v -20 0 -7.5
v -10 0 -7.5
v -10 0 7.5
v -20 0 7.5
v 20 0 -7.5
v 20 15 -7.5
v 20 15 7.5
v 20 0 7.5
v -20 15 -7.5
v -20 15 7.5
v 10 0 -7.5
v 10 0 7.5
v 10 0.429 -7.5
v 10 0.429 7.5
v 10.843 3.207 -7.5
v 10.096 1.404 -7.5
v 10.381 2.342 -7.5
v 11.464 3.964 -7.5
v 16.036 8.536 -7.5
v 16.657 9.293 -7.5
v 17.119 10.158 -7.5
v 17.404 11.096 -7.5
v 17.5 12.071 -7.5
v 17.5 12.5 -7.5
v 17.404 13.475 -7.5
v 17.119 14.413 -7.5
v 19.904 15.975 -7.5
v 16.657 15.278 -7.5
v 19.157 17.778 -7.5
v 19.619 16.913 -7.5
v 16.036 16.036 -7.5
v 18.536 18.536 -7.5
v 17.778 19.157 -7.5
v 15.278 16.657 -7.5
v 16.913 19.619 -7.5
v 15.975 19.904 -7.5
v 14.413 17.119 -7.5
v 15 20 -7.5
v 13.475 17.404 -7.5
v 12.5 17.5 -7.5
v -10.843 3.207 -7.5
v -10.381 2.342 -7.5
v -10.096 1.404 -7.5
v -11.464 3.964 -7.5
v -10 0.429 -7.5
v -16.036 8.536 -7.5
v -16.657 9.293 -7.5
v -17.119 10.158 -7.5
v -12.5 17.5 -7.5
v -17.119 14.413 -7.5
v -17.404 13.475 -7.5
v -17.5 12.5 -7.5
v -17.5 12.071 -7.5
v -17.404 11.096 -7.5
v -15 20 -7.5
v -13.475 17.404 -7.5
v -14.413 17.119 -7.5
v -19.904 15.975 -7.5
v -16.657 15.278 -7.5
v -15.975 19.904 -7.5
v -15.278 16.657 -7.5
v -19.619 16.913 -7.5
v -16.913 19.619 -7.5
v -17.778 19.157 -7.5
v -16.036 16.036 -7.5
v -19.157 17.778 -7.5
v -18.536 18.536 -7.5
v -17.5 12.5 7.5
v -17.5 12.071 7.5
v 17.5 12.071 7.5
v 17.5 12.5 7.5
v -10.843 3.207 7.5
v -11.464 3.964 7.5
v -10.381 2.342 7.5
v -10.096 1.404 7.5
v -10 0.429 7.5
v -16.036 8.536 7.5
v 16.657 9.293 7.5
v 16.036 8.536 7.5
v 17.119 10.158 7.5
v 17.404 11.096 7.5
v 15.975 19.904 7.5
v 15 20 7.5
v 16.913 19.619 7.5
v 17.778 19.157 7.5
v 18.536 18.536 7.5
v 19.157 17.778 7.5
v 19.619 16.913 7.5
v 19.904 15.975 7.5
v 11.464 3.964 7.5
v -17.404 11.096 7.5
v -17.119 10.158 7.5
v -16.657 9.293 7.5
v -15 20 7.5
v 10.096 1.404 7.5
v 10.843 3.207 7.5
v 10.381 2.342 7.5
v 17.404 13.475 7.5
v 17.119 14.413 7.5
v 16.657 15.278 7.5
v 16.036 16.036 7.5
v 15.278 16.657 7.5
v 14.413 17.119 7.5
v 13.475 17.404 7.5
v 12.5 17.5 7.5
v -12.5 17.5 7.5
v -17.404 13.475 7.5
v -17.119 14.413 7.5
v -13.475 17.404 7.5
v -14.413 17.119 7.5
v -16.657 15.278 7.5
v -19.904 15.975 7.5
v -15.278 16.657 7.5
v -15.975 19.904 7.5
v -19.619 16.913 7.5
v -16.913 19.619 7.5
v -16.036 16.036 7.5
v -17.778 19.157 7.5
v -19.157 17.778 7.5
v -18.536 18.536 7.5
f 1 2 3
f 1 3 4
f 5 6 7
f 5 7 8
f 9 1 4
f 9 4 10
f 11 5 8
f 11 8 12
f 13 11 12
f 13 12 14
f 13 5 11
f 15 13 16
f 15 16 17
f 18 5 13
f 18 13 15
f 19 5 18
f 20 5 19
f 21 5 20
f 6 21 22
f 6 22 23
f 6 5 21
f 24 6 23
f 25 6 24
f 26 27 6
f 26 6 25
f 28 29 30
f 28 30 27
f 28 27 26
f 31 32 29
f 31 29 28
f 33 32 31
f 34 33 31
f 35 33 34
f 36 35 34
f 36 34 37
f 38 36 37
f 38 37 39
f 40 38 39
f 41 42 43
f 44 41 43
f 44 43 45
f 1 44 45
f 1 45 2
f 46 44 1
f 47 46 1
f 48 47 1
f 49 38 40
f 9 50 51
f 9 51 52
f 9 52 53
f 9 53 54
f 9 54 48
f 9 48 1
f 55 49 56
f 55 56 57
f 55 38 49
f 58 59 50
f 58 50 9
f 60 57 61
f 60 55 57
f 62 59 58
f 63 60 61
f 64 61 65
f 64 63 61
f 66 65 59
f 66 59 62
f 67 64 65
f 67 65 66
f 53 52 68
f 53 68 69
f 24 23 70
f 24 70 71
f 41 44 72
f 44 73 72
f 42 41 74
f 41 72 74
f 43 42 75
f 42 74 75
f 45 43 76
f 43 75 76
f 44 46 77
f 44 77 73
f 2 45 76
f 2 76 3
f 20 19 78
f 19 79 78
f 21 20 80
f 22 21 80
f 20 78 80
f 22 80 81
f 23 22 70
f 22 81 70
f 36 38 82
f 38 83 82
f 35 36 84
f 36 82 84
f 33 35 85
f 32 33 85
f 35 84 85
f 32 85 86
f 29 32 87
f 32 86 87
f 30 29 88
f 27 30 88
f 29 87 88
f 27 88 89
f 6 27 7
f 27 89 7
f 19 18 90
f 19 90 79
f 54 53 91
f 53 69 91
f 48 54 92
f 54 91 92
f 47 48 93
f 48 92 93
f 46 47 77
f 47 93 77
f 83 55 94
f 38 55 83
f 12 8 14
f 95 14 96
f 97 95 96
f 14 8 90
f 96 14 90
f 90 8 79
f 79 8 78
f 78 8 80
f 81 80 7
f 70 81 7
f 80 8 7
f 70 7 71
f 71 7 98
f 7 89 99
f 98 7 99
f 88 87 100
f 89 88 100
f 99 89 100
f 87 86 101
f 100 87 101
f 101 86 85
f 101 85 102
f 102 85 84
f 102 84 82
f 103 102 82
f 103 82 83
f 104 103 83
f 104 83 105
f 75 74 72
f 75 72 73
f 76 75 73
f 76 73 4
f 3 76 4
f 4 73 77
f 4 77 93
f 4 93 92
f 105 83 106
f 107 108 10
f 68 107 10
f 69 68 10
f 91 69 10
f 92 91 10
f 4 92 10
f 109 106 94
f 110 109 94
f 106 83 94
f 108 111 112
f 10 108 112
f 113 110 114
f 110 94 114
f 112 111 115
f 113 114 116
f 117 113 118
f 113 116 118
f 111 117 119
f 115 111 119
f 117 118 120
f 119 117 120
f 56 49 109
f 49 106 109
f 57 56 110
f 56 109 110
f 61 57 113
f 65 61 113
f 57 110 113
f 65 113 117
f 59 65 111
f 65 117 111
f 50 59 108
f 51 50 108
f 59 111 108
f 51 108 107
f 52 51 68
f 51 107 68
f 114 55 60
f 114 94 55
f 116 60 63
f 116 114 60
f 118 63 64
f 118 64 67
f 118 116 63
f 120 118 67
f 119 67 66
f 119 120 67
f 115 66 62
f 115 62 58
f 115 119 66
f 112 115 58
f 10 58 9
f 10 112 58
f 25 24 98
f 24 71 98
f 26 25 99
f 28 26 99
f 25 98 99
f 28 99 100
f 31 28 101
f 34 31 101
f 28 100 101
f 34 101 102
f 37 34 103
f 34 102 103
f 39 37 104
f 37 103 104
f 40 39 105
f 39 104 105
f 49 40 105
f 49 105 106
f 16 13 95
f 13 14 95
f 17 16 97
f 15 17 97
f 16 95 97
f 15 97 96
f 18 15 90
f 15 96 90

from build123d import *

# Parameters (mm, degrees)
BOSS_EXTRUDE1_DEPTH      = 7.5
BOSS_EXTRUDE1_DEPTH_BACK = 7.5
FILLET1_R                = 5


with BuildPart() as part:
    # Sketch1 → Boss-Extrude1 (new, two sides: drawn at the far end of the back side and taken through both)
    with BuildSketch(Plane.XY.offset(-BOSS_EXTRUDE1_DEPTH_BACK)):
        Polygon((-20, 20), (20, 20), (20, 0), (10, 0), (10, 2.5), (17.5, 10), (17.5, 17.5), (-17.5, 17.5), (-17.5, 10), (-10, 2.5), (-10, 0), (-20, 0), align=None)
    extrude(amount=BOSS_EXTRUDE1_DEPTH + BOSS_EXTRUDE1_DEPTH_BACK)

    # Fillet1
    fillet1_edges = [part.edges().sort_by_distance(p)[0] for p in [
        (-20, 20, 0),
        (20, 20, 0),
        (10, 2.5, 0),
        (17.5, 10, 0),
        (17.5, 17.5, 0),
        (-17.5, 17.5, 0),
        (-17.5, 10, 0),
        (-10, 2.5, 0),
    ]]
    fillet(fillet1_edges, radius=FILLET1_R)


solid = part.part
